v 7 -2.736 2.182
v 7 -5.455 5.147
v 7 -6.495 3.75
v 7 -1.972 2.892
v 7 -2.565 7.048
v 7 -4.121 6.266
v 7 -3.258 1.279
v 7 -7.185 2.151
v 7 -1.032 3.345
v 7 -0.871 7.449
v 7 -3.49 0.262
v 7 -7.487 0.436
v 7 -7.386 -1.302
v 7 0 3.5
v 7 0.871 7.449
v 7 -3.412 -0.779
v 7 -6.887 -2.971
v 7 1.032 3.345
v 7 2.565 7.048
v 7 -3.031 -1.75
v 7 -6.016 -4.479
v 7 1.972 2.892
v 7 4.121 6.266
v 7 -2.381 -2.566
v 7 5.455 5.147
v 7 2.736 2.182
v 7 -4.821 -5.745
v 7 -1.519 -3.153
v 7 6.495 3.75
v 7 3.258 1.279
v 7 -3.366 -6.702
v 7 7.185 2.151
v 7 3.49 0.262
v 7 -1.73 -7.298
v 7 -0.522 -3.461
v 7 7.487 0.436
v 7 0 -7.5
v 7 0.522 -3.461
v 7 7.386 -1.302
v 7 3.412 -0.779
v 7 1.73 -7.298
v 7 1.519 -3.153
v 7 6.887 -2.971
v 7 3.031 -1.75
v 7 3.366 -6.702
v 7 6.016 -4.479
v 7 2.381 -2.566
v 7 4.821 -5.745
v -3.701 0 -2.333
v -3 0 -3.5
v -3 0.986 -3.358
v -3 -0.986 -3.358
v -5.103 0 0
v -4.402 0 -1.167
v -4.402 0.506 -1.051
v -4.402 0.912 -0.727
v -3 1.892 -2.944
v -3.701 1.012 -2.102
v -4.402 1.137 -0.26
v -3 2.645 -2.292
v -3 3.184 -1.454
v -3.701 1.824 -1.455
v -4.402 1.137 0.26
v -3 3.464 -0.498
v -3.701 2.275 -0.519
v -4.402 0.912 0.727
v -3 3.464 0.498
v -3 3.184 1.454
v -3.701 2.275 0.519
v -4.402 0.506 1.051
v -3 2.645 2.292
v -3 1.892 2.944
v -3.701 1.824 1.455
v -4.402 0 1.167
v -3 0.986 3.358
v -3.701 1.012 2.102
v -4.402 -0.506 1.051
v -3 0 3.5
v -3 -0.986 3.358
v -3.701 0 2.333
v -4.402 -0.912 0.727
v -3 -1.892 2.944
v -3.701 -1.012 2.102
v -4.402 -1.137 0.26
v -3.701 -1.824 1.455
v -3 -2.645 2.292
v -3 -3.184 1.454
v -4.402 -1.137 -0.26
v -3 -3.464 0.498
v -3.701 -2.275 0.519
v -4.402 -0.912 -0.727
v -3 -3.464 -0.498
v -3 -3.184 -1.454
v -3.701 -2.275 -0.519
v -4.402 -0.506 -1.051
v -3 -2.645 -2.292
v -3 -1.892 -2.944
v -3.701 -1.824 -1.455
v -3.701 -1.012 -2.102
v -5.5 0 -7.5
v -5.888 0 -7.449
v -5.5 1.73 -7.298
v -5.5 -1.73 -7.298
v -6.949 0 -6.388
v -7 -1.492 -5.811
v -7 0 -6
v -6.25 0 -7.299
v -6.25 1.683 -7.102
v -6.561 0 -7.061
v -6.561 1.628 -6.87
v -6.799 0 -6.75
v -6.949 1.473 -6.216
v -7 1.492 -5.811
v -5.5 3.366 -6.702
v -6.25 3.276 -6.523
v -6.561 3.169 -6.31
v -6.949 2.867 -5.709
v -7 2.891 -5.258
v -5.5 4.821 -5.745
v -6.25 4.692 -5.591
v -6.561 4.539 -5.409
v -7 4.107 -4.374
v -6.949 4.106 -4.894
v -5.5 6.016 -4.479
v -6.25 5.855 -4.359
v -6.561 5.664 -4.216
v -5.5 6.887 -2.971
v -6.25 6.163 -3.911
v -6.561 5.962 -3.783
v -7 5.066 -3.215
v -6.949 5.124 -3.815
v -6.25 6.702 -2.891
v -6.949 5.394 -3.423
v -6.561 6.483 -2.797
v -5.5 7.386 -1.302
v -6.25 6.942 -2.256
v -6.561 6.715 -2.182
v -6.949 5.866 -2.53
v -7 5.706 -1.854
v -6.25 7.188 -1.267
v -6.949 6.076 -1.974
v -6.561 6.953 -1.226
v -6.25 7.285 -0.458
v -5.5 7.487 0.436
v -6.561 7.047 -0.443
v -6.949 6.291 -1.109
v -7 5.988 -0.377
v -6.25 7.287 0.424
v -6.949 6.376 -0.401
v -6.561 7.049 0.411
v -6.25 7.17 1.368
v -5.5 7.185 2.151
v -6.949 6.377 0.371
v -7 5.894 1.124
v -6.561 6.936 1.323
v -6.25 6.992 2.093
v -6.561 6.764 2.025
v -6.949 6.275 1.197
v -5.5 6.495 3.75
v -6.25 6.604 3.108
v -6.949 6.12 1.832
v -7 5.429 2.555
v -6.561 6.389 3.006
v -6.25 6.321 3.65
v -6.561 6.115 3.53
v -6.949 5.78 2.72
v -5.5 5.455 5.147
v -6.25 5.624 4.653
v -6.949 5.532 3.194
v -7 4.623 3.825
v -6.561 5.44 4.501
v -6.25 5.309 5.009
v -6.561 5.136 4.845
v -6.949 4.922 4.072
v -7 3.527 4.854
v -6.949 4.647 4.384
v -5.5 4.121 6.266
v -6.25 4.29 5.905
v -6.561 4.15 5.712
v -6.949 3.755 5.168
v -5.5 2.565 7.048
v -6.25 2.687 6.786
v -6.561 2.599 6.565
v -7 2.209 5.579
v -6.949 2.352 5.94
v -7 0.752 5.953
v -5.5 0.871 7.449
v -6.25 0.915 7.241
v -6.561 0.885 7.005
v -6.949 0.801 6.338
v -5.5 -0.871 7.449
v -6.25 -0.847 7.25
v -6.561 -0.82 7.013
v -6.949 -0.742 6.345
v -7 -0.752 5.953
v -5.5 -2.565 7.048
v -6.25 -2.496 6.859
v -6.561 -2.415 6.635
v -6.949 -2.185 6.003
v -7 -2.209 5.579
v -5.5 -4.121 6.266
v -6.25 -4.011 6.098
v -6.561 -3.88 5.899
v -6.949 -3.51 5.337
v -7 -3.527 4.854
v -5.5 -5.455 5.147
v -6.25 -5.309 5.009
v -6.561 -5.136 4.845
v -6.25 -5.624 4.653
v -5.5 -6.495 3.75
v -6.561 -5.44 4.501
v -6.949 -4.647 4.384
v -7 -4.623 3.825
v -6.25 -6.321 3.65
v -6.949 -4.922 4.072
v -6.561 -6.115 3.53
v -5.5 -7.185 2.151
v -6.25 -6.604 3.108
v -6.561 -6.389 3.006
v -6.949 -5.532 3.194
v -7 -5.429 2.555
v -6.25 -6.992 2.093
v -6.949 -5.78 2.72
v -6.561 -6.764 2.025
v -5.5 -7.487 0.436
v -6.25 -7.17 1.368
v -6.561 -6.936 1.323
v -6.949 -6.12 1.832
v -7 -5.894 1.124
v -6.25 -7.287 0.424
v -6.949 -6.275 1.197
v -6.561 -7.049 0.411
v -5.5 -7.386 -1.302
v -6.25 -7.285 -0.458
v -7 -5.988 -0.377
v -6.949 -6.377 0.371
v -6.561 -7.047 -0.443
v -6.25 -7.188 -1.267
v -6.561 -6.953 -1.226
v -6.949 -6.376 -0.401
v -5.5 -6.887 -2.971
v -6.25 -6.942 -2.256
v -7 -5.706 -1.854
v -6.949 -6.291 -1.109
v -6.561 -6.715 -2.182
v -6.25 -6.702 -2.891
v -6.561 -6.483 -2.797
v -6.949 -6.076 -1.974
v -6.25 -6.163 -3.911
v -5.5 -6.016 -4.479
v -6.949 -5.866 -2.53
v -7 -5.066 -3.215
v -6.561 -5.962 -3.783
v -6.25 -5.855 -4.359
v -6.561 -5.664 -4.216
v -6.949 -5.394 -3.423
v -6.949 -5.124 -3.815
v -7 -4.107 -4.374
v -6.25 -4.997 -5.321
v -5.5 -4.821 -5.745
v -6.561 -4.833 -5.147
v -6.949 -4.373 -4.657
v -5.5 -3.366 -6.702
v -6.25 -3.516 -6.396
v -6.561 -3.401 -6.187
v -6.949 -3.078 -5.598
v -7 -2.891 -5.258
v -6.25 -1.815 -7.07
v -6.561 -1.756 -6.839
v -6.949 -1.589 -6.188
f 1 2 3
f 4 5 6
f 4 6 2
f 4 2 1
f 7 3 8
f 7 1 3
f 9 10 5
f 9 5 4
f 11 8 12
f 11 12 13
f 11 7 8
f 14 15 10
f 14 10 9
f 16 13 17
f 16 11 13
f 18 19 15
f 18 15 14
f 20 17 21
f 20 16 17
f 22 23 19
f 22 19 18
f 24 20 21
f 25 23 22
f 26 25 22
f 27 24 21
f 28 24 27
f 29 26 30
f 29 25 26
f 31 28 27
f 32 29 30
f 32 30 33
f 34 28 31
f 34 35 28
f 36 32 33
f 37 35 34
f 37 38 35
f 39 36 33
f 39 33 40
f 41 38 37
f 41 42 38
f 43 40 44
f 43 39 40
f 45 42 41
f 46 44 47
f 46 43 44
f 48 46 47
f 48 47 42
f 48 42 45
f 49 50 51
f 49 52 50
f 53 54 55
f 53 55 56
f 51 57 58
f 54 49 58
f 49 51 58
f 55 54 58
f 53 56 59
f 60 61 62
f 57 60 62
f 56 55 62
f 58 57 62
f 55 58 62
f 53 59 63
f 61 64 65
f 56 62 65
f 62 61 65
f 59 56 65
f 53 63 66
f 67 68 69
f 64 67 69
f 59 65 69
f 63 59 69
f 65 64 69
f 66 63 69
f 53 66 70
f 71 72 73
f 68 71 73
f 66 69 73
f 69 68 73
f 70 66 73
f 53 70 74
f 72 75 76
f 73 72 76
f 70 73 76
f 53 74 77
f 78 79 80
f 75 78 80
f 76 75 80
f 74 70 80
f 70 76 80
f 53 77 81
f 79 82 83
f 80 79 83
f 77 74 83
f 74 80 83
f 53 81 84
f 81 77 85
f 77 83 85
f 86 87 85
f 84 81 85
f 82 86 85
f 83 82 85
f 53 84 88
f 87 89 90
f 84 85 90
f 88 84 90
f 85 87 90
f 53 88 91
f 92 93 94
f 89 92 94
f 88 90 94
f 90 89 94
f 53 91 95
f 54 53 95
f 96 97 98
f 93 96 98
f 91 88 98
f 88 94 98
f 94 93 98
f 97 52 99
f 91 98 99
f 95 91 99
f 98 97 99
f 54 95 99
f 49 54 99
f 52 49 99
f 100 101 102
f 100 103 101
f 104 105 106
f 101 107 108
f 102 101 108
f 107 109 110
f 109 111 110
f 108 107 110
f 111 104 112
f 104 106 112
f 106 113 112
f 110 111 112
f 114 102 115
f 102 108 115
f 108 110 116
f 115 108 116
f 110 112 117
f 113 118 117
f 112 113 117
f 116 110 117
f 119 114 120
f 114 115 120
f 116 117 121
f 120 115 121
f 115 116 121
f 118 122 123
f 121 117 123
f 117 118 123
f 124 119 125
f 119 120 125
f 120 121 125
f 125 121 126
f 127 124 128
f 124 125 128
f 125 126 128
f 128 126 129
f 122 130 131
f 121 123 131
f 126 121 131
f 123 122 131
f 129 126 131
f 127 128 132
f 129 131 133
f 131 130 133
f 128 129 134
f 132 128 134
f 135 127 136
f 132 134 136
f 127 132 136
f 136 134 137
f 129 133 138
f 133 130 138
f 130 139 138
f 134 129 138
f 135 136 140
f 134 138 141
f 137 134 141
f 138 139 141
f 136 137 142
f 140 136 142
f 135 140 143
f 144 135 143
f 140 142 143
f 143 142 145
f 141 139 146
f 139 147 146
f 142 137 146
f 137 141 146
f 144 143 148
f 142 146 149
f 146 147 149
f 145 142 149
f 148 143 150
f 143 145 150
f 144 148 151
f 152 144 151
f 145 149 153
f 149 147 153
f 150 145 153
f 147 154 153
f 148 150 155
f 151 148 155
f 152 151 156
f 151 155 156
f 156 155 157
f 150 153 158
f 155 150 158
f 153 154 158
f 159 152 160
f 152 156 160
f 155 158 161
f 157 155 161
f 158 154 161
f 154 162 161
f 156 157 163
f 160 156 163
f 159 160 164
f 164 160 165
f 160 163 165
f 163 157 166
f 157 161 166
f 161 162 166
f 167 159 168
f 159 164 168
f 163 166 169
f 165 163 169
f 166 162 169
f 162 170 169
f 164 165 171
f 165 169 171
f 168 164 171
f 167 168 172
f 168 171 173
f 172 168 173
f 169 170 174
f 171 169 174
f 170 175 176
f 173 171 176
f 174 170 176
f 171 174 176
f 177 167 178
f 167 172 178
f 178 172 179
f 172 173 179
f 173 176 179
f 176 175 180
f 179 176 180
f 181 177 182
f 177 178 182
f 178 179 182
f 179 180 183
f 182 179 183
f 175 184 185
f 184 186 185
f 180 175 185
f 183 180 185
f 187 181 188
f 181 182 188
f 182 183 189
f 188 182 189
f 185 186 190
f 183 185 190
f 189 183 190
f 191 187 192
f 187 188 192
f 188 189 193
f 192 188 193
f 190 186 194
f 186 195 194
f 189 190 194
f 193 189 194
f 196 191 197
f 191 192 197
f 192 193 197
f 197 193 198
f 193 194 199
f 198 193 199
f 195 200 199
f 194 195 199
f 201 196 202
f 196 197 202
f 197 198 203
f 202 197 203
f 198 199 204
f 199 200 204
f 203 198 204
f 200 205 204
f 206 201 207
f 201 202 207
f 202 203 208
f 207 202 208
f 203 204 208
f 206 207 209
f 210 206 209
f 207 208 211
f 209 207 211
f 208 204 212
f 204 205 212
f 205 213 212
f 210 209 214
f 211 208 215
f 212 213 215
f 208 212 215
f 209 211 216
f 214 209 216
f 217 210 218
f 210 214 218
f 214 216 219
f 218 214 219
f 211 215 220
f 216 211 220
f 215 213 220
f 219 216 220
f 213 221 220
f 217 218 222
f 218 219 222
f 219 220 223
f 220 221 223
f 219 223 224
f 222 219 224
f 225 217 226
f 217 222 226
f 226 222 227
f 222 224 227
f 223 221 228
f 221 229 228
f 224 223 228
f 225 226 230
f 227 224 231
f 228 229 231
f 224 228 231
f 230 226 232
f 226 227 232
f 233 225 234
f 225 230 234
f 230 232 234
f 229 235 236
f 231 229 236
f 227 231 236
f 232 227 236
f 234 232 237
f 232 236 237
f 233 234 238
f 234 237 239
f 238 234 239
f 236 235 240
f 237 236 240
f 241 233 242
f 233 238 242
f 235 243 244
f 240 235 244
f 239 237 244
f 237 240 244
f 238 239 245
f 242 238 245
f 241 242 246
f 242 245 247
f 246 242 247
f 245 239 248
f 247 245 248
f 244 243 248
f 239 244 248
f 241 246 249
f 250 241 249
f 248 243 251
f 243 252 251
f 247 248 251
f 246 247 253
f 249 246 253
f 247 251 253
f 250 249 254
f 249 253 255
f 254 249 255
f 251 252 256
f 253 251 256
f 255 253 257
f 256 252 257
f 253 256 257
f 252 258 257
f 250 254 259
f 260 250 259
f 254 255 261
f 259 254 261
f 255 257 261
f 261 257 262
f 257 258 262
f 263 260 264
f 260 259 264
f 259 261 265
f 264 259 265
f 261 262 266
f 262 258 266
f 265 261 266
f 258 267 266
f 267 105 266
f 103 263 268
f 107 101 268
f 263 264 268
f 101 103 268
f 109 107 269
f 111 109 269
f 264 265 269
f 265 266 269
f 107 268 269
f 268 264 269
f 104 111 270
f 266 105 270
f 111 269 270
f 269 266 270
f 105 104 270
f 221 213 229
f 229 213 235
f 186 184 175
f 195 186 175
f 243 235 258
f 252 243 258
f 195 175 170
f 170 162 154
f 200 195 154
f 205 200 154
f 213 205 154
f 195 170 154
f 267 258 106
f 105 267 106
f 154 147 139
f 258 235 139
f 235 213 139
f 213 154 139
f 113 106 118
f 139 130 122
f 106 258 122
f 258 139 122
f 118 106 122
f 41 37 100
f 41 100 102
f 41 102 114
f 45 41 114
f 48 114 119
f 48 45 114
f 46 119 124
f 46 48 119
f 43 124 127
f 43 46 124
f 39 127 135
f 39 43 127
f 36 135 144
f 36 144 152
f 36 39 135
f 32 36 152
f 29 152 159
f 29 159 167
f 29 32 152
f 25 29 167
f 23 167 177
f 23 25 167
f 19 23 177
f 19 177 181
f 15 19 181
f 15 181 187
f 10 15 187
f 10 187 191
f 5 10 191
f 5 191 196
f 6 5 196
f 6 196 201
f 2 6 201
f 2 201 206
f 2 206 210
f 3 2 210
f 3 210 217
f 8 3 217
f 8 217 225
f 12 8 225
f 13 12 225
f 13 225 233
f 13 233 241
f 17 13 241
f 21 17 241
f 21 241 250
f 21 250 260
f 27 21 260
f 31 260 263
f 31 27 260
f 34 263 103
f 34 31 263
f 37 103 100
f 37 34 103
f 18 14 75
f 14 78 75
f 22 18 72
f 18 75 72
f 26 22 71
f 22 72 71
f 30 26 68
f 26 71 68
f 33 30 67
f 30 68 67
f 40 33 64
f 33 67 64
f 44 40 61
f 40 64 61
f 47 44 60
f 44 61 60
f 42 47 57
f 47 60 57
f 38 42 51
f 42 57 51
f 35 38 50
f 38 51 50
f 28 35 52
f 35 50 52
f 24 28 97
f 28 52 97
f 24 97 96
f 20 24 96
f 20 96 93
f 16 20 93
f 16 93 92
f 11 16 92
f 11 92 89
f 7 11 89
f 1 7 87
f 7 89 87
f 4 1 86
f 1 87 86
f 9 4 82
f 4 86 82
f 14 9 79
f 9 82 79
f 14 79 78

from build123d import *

# Parameters (mm, degrees)
SKETCH1_R                 = 7.5
BOSS_EXTRUDE1_DEPTH       = 7
M8X1_0_TAPPED_HOLE1_D     = 7
M8X1_0_TAPPED_HOLE1_DEPTH = 10
M8X1_0_TAPPED_HOLE1_TIP   = 2.103012167
FILLET1_R                 = 1.5


with BuildPart() as part:
    # Sketch1 → Boss-Extrude1 (new, symmetric)
    with BuildSketch(Plane(origin=(0, 0, 0), x_dir=(0, 0, -1), z_dir=(1, 0, 0))):
        Circle(SKETCH1_R)
    extrude(amount=BOSS_EXTRUDE1_DEPTH, both=True)

    # M8x1.0 Tapped Hole1
    with Locations(Plane(origin=(7, 0, 0), x_dir=(0, 0, -1), z_dir=(1, 0, 0))):
        with Locations((0, 0)):
            Hole(M8X1_0_TAPPED_HOLE1_D / 2, depth=M8X1_0_TAPPED_HOLE1_DEPTH)
            with Locations((0, 0, -(M8X1_0_TAPPED_HOLE1_DEPTH + M8X1_0_TAPPED_HOLE1_TIP / 2))):  # 118° drill point
                Cone(0, M8X1_0_TAPPED_HOLE1_D / 2, M8X1_0_TAPPED_HOLE1_TIP, mode=Mode.SUBTRACT)

    # Fillet1
    fillet1_edges = [part.edges().sort_by_distance(p)[0] for p in [
        (-7, 0, 7.5),
    ]]
    fillet(fillet1_edges, radius=FILLET1_R)


solid = part.part
